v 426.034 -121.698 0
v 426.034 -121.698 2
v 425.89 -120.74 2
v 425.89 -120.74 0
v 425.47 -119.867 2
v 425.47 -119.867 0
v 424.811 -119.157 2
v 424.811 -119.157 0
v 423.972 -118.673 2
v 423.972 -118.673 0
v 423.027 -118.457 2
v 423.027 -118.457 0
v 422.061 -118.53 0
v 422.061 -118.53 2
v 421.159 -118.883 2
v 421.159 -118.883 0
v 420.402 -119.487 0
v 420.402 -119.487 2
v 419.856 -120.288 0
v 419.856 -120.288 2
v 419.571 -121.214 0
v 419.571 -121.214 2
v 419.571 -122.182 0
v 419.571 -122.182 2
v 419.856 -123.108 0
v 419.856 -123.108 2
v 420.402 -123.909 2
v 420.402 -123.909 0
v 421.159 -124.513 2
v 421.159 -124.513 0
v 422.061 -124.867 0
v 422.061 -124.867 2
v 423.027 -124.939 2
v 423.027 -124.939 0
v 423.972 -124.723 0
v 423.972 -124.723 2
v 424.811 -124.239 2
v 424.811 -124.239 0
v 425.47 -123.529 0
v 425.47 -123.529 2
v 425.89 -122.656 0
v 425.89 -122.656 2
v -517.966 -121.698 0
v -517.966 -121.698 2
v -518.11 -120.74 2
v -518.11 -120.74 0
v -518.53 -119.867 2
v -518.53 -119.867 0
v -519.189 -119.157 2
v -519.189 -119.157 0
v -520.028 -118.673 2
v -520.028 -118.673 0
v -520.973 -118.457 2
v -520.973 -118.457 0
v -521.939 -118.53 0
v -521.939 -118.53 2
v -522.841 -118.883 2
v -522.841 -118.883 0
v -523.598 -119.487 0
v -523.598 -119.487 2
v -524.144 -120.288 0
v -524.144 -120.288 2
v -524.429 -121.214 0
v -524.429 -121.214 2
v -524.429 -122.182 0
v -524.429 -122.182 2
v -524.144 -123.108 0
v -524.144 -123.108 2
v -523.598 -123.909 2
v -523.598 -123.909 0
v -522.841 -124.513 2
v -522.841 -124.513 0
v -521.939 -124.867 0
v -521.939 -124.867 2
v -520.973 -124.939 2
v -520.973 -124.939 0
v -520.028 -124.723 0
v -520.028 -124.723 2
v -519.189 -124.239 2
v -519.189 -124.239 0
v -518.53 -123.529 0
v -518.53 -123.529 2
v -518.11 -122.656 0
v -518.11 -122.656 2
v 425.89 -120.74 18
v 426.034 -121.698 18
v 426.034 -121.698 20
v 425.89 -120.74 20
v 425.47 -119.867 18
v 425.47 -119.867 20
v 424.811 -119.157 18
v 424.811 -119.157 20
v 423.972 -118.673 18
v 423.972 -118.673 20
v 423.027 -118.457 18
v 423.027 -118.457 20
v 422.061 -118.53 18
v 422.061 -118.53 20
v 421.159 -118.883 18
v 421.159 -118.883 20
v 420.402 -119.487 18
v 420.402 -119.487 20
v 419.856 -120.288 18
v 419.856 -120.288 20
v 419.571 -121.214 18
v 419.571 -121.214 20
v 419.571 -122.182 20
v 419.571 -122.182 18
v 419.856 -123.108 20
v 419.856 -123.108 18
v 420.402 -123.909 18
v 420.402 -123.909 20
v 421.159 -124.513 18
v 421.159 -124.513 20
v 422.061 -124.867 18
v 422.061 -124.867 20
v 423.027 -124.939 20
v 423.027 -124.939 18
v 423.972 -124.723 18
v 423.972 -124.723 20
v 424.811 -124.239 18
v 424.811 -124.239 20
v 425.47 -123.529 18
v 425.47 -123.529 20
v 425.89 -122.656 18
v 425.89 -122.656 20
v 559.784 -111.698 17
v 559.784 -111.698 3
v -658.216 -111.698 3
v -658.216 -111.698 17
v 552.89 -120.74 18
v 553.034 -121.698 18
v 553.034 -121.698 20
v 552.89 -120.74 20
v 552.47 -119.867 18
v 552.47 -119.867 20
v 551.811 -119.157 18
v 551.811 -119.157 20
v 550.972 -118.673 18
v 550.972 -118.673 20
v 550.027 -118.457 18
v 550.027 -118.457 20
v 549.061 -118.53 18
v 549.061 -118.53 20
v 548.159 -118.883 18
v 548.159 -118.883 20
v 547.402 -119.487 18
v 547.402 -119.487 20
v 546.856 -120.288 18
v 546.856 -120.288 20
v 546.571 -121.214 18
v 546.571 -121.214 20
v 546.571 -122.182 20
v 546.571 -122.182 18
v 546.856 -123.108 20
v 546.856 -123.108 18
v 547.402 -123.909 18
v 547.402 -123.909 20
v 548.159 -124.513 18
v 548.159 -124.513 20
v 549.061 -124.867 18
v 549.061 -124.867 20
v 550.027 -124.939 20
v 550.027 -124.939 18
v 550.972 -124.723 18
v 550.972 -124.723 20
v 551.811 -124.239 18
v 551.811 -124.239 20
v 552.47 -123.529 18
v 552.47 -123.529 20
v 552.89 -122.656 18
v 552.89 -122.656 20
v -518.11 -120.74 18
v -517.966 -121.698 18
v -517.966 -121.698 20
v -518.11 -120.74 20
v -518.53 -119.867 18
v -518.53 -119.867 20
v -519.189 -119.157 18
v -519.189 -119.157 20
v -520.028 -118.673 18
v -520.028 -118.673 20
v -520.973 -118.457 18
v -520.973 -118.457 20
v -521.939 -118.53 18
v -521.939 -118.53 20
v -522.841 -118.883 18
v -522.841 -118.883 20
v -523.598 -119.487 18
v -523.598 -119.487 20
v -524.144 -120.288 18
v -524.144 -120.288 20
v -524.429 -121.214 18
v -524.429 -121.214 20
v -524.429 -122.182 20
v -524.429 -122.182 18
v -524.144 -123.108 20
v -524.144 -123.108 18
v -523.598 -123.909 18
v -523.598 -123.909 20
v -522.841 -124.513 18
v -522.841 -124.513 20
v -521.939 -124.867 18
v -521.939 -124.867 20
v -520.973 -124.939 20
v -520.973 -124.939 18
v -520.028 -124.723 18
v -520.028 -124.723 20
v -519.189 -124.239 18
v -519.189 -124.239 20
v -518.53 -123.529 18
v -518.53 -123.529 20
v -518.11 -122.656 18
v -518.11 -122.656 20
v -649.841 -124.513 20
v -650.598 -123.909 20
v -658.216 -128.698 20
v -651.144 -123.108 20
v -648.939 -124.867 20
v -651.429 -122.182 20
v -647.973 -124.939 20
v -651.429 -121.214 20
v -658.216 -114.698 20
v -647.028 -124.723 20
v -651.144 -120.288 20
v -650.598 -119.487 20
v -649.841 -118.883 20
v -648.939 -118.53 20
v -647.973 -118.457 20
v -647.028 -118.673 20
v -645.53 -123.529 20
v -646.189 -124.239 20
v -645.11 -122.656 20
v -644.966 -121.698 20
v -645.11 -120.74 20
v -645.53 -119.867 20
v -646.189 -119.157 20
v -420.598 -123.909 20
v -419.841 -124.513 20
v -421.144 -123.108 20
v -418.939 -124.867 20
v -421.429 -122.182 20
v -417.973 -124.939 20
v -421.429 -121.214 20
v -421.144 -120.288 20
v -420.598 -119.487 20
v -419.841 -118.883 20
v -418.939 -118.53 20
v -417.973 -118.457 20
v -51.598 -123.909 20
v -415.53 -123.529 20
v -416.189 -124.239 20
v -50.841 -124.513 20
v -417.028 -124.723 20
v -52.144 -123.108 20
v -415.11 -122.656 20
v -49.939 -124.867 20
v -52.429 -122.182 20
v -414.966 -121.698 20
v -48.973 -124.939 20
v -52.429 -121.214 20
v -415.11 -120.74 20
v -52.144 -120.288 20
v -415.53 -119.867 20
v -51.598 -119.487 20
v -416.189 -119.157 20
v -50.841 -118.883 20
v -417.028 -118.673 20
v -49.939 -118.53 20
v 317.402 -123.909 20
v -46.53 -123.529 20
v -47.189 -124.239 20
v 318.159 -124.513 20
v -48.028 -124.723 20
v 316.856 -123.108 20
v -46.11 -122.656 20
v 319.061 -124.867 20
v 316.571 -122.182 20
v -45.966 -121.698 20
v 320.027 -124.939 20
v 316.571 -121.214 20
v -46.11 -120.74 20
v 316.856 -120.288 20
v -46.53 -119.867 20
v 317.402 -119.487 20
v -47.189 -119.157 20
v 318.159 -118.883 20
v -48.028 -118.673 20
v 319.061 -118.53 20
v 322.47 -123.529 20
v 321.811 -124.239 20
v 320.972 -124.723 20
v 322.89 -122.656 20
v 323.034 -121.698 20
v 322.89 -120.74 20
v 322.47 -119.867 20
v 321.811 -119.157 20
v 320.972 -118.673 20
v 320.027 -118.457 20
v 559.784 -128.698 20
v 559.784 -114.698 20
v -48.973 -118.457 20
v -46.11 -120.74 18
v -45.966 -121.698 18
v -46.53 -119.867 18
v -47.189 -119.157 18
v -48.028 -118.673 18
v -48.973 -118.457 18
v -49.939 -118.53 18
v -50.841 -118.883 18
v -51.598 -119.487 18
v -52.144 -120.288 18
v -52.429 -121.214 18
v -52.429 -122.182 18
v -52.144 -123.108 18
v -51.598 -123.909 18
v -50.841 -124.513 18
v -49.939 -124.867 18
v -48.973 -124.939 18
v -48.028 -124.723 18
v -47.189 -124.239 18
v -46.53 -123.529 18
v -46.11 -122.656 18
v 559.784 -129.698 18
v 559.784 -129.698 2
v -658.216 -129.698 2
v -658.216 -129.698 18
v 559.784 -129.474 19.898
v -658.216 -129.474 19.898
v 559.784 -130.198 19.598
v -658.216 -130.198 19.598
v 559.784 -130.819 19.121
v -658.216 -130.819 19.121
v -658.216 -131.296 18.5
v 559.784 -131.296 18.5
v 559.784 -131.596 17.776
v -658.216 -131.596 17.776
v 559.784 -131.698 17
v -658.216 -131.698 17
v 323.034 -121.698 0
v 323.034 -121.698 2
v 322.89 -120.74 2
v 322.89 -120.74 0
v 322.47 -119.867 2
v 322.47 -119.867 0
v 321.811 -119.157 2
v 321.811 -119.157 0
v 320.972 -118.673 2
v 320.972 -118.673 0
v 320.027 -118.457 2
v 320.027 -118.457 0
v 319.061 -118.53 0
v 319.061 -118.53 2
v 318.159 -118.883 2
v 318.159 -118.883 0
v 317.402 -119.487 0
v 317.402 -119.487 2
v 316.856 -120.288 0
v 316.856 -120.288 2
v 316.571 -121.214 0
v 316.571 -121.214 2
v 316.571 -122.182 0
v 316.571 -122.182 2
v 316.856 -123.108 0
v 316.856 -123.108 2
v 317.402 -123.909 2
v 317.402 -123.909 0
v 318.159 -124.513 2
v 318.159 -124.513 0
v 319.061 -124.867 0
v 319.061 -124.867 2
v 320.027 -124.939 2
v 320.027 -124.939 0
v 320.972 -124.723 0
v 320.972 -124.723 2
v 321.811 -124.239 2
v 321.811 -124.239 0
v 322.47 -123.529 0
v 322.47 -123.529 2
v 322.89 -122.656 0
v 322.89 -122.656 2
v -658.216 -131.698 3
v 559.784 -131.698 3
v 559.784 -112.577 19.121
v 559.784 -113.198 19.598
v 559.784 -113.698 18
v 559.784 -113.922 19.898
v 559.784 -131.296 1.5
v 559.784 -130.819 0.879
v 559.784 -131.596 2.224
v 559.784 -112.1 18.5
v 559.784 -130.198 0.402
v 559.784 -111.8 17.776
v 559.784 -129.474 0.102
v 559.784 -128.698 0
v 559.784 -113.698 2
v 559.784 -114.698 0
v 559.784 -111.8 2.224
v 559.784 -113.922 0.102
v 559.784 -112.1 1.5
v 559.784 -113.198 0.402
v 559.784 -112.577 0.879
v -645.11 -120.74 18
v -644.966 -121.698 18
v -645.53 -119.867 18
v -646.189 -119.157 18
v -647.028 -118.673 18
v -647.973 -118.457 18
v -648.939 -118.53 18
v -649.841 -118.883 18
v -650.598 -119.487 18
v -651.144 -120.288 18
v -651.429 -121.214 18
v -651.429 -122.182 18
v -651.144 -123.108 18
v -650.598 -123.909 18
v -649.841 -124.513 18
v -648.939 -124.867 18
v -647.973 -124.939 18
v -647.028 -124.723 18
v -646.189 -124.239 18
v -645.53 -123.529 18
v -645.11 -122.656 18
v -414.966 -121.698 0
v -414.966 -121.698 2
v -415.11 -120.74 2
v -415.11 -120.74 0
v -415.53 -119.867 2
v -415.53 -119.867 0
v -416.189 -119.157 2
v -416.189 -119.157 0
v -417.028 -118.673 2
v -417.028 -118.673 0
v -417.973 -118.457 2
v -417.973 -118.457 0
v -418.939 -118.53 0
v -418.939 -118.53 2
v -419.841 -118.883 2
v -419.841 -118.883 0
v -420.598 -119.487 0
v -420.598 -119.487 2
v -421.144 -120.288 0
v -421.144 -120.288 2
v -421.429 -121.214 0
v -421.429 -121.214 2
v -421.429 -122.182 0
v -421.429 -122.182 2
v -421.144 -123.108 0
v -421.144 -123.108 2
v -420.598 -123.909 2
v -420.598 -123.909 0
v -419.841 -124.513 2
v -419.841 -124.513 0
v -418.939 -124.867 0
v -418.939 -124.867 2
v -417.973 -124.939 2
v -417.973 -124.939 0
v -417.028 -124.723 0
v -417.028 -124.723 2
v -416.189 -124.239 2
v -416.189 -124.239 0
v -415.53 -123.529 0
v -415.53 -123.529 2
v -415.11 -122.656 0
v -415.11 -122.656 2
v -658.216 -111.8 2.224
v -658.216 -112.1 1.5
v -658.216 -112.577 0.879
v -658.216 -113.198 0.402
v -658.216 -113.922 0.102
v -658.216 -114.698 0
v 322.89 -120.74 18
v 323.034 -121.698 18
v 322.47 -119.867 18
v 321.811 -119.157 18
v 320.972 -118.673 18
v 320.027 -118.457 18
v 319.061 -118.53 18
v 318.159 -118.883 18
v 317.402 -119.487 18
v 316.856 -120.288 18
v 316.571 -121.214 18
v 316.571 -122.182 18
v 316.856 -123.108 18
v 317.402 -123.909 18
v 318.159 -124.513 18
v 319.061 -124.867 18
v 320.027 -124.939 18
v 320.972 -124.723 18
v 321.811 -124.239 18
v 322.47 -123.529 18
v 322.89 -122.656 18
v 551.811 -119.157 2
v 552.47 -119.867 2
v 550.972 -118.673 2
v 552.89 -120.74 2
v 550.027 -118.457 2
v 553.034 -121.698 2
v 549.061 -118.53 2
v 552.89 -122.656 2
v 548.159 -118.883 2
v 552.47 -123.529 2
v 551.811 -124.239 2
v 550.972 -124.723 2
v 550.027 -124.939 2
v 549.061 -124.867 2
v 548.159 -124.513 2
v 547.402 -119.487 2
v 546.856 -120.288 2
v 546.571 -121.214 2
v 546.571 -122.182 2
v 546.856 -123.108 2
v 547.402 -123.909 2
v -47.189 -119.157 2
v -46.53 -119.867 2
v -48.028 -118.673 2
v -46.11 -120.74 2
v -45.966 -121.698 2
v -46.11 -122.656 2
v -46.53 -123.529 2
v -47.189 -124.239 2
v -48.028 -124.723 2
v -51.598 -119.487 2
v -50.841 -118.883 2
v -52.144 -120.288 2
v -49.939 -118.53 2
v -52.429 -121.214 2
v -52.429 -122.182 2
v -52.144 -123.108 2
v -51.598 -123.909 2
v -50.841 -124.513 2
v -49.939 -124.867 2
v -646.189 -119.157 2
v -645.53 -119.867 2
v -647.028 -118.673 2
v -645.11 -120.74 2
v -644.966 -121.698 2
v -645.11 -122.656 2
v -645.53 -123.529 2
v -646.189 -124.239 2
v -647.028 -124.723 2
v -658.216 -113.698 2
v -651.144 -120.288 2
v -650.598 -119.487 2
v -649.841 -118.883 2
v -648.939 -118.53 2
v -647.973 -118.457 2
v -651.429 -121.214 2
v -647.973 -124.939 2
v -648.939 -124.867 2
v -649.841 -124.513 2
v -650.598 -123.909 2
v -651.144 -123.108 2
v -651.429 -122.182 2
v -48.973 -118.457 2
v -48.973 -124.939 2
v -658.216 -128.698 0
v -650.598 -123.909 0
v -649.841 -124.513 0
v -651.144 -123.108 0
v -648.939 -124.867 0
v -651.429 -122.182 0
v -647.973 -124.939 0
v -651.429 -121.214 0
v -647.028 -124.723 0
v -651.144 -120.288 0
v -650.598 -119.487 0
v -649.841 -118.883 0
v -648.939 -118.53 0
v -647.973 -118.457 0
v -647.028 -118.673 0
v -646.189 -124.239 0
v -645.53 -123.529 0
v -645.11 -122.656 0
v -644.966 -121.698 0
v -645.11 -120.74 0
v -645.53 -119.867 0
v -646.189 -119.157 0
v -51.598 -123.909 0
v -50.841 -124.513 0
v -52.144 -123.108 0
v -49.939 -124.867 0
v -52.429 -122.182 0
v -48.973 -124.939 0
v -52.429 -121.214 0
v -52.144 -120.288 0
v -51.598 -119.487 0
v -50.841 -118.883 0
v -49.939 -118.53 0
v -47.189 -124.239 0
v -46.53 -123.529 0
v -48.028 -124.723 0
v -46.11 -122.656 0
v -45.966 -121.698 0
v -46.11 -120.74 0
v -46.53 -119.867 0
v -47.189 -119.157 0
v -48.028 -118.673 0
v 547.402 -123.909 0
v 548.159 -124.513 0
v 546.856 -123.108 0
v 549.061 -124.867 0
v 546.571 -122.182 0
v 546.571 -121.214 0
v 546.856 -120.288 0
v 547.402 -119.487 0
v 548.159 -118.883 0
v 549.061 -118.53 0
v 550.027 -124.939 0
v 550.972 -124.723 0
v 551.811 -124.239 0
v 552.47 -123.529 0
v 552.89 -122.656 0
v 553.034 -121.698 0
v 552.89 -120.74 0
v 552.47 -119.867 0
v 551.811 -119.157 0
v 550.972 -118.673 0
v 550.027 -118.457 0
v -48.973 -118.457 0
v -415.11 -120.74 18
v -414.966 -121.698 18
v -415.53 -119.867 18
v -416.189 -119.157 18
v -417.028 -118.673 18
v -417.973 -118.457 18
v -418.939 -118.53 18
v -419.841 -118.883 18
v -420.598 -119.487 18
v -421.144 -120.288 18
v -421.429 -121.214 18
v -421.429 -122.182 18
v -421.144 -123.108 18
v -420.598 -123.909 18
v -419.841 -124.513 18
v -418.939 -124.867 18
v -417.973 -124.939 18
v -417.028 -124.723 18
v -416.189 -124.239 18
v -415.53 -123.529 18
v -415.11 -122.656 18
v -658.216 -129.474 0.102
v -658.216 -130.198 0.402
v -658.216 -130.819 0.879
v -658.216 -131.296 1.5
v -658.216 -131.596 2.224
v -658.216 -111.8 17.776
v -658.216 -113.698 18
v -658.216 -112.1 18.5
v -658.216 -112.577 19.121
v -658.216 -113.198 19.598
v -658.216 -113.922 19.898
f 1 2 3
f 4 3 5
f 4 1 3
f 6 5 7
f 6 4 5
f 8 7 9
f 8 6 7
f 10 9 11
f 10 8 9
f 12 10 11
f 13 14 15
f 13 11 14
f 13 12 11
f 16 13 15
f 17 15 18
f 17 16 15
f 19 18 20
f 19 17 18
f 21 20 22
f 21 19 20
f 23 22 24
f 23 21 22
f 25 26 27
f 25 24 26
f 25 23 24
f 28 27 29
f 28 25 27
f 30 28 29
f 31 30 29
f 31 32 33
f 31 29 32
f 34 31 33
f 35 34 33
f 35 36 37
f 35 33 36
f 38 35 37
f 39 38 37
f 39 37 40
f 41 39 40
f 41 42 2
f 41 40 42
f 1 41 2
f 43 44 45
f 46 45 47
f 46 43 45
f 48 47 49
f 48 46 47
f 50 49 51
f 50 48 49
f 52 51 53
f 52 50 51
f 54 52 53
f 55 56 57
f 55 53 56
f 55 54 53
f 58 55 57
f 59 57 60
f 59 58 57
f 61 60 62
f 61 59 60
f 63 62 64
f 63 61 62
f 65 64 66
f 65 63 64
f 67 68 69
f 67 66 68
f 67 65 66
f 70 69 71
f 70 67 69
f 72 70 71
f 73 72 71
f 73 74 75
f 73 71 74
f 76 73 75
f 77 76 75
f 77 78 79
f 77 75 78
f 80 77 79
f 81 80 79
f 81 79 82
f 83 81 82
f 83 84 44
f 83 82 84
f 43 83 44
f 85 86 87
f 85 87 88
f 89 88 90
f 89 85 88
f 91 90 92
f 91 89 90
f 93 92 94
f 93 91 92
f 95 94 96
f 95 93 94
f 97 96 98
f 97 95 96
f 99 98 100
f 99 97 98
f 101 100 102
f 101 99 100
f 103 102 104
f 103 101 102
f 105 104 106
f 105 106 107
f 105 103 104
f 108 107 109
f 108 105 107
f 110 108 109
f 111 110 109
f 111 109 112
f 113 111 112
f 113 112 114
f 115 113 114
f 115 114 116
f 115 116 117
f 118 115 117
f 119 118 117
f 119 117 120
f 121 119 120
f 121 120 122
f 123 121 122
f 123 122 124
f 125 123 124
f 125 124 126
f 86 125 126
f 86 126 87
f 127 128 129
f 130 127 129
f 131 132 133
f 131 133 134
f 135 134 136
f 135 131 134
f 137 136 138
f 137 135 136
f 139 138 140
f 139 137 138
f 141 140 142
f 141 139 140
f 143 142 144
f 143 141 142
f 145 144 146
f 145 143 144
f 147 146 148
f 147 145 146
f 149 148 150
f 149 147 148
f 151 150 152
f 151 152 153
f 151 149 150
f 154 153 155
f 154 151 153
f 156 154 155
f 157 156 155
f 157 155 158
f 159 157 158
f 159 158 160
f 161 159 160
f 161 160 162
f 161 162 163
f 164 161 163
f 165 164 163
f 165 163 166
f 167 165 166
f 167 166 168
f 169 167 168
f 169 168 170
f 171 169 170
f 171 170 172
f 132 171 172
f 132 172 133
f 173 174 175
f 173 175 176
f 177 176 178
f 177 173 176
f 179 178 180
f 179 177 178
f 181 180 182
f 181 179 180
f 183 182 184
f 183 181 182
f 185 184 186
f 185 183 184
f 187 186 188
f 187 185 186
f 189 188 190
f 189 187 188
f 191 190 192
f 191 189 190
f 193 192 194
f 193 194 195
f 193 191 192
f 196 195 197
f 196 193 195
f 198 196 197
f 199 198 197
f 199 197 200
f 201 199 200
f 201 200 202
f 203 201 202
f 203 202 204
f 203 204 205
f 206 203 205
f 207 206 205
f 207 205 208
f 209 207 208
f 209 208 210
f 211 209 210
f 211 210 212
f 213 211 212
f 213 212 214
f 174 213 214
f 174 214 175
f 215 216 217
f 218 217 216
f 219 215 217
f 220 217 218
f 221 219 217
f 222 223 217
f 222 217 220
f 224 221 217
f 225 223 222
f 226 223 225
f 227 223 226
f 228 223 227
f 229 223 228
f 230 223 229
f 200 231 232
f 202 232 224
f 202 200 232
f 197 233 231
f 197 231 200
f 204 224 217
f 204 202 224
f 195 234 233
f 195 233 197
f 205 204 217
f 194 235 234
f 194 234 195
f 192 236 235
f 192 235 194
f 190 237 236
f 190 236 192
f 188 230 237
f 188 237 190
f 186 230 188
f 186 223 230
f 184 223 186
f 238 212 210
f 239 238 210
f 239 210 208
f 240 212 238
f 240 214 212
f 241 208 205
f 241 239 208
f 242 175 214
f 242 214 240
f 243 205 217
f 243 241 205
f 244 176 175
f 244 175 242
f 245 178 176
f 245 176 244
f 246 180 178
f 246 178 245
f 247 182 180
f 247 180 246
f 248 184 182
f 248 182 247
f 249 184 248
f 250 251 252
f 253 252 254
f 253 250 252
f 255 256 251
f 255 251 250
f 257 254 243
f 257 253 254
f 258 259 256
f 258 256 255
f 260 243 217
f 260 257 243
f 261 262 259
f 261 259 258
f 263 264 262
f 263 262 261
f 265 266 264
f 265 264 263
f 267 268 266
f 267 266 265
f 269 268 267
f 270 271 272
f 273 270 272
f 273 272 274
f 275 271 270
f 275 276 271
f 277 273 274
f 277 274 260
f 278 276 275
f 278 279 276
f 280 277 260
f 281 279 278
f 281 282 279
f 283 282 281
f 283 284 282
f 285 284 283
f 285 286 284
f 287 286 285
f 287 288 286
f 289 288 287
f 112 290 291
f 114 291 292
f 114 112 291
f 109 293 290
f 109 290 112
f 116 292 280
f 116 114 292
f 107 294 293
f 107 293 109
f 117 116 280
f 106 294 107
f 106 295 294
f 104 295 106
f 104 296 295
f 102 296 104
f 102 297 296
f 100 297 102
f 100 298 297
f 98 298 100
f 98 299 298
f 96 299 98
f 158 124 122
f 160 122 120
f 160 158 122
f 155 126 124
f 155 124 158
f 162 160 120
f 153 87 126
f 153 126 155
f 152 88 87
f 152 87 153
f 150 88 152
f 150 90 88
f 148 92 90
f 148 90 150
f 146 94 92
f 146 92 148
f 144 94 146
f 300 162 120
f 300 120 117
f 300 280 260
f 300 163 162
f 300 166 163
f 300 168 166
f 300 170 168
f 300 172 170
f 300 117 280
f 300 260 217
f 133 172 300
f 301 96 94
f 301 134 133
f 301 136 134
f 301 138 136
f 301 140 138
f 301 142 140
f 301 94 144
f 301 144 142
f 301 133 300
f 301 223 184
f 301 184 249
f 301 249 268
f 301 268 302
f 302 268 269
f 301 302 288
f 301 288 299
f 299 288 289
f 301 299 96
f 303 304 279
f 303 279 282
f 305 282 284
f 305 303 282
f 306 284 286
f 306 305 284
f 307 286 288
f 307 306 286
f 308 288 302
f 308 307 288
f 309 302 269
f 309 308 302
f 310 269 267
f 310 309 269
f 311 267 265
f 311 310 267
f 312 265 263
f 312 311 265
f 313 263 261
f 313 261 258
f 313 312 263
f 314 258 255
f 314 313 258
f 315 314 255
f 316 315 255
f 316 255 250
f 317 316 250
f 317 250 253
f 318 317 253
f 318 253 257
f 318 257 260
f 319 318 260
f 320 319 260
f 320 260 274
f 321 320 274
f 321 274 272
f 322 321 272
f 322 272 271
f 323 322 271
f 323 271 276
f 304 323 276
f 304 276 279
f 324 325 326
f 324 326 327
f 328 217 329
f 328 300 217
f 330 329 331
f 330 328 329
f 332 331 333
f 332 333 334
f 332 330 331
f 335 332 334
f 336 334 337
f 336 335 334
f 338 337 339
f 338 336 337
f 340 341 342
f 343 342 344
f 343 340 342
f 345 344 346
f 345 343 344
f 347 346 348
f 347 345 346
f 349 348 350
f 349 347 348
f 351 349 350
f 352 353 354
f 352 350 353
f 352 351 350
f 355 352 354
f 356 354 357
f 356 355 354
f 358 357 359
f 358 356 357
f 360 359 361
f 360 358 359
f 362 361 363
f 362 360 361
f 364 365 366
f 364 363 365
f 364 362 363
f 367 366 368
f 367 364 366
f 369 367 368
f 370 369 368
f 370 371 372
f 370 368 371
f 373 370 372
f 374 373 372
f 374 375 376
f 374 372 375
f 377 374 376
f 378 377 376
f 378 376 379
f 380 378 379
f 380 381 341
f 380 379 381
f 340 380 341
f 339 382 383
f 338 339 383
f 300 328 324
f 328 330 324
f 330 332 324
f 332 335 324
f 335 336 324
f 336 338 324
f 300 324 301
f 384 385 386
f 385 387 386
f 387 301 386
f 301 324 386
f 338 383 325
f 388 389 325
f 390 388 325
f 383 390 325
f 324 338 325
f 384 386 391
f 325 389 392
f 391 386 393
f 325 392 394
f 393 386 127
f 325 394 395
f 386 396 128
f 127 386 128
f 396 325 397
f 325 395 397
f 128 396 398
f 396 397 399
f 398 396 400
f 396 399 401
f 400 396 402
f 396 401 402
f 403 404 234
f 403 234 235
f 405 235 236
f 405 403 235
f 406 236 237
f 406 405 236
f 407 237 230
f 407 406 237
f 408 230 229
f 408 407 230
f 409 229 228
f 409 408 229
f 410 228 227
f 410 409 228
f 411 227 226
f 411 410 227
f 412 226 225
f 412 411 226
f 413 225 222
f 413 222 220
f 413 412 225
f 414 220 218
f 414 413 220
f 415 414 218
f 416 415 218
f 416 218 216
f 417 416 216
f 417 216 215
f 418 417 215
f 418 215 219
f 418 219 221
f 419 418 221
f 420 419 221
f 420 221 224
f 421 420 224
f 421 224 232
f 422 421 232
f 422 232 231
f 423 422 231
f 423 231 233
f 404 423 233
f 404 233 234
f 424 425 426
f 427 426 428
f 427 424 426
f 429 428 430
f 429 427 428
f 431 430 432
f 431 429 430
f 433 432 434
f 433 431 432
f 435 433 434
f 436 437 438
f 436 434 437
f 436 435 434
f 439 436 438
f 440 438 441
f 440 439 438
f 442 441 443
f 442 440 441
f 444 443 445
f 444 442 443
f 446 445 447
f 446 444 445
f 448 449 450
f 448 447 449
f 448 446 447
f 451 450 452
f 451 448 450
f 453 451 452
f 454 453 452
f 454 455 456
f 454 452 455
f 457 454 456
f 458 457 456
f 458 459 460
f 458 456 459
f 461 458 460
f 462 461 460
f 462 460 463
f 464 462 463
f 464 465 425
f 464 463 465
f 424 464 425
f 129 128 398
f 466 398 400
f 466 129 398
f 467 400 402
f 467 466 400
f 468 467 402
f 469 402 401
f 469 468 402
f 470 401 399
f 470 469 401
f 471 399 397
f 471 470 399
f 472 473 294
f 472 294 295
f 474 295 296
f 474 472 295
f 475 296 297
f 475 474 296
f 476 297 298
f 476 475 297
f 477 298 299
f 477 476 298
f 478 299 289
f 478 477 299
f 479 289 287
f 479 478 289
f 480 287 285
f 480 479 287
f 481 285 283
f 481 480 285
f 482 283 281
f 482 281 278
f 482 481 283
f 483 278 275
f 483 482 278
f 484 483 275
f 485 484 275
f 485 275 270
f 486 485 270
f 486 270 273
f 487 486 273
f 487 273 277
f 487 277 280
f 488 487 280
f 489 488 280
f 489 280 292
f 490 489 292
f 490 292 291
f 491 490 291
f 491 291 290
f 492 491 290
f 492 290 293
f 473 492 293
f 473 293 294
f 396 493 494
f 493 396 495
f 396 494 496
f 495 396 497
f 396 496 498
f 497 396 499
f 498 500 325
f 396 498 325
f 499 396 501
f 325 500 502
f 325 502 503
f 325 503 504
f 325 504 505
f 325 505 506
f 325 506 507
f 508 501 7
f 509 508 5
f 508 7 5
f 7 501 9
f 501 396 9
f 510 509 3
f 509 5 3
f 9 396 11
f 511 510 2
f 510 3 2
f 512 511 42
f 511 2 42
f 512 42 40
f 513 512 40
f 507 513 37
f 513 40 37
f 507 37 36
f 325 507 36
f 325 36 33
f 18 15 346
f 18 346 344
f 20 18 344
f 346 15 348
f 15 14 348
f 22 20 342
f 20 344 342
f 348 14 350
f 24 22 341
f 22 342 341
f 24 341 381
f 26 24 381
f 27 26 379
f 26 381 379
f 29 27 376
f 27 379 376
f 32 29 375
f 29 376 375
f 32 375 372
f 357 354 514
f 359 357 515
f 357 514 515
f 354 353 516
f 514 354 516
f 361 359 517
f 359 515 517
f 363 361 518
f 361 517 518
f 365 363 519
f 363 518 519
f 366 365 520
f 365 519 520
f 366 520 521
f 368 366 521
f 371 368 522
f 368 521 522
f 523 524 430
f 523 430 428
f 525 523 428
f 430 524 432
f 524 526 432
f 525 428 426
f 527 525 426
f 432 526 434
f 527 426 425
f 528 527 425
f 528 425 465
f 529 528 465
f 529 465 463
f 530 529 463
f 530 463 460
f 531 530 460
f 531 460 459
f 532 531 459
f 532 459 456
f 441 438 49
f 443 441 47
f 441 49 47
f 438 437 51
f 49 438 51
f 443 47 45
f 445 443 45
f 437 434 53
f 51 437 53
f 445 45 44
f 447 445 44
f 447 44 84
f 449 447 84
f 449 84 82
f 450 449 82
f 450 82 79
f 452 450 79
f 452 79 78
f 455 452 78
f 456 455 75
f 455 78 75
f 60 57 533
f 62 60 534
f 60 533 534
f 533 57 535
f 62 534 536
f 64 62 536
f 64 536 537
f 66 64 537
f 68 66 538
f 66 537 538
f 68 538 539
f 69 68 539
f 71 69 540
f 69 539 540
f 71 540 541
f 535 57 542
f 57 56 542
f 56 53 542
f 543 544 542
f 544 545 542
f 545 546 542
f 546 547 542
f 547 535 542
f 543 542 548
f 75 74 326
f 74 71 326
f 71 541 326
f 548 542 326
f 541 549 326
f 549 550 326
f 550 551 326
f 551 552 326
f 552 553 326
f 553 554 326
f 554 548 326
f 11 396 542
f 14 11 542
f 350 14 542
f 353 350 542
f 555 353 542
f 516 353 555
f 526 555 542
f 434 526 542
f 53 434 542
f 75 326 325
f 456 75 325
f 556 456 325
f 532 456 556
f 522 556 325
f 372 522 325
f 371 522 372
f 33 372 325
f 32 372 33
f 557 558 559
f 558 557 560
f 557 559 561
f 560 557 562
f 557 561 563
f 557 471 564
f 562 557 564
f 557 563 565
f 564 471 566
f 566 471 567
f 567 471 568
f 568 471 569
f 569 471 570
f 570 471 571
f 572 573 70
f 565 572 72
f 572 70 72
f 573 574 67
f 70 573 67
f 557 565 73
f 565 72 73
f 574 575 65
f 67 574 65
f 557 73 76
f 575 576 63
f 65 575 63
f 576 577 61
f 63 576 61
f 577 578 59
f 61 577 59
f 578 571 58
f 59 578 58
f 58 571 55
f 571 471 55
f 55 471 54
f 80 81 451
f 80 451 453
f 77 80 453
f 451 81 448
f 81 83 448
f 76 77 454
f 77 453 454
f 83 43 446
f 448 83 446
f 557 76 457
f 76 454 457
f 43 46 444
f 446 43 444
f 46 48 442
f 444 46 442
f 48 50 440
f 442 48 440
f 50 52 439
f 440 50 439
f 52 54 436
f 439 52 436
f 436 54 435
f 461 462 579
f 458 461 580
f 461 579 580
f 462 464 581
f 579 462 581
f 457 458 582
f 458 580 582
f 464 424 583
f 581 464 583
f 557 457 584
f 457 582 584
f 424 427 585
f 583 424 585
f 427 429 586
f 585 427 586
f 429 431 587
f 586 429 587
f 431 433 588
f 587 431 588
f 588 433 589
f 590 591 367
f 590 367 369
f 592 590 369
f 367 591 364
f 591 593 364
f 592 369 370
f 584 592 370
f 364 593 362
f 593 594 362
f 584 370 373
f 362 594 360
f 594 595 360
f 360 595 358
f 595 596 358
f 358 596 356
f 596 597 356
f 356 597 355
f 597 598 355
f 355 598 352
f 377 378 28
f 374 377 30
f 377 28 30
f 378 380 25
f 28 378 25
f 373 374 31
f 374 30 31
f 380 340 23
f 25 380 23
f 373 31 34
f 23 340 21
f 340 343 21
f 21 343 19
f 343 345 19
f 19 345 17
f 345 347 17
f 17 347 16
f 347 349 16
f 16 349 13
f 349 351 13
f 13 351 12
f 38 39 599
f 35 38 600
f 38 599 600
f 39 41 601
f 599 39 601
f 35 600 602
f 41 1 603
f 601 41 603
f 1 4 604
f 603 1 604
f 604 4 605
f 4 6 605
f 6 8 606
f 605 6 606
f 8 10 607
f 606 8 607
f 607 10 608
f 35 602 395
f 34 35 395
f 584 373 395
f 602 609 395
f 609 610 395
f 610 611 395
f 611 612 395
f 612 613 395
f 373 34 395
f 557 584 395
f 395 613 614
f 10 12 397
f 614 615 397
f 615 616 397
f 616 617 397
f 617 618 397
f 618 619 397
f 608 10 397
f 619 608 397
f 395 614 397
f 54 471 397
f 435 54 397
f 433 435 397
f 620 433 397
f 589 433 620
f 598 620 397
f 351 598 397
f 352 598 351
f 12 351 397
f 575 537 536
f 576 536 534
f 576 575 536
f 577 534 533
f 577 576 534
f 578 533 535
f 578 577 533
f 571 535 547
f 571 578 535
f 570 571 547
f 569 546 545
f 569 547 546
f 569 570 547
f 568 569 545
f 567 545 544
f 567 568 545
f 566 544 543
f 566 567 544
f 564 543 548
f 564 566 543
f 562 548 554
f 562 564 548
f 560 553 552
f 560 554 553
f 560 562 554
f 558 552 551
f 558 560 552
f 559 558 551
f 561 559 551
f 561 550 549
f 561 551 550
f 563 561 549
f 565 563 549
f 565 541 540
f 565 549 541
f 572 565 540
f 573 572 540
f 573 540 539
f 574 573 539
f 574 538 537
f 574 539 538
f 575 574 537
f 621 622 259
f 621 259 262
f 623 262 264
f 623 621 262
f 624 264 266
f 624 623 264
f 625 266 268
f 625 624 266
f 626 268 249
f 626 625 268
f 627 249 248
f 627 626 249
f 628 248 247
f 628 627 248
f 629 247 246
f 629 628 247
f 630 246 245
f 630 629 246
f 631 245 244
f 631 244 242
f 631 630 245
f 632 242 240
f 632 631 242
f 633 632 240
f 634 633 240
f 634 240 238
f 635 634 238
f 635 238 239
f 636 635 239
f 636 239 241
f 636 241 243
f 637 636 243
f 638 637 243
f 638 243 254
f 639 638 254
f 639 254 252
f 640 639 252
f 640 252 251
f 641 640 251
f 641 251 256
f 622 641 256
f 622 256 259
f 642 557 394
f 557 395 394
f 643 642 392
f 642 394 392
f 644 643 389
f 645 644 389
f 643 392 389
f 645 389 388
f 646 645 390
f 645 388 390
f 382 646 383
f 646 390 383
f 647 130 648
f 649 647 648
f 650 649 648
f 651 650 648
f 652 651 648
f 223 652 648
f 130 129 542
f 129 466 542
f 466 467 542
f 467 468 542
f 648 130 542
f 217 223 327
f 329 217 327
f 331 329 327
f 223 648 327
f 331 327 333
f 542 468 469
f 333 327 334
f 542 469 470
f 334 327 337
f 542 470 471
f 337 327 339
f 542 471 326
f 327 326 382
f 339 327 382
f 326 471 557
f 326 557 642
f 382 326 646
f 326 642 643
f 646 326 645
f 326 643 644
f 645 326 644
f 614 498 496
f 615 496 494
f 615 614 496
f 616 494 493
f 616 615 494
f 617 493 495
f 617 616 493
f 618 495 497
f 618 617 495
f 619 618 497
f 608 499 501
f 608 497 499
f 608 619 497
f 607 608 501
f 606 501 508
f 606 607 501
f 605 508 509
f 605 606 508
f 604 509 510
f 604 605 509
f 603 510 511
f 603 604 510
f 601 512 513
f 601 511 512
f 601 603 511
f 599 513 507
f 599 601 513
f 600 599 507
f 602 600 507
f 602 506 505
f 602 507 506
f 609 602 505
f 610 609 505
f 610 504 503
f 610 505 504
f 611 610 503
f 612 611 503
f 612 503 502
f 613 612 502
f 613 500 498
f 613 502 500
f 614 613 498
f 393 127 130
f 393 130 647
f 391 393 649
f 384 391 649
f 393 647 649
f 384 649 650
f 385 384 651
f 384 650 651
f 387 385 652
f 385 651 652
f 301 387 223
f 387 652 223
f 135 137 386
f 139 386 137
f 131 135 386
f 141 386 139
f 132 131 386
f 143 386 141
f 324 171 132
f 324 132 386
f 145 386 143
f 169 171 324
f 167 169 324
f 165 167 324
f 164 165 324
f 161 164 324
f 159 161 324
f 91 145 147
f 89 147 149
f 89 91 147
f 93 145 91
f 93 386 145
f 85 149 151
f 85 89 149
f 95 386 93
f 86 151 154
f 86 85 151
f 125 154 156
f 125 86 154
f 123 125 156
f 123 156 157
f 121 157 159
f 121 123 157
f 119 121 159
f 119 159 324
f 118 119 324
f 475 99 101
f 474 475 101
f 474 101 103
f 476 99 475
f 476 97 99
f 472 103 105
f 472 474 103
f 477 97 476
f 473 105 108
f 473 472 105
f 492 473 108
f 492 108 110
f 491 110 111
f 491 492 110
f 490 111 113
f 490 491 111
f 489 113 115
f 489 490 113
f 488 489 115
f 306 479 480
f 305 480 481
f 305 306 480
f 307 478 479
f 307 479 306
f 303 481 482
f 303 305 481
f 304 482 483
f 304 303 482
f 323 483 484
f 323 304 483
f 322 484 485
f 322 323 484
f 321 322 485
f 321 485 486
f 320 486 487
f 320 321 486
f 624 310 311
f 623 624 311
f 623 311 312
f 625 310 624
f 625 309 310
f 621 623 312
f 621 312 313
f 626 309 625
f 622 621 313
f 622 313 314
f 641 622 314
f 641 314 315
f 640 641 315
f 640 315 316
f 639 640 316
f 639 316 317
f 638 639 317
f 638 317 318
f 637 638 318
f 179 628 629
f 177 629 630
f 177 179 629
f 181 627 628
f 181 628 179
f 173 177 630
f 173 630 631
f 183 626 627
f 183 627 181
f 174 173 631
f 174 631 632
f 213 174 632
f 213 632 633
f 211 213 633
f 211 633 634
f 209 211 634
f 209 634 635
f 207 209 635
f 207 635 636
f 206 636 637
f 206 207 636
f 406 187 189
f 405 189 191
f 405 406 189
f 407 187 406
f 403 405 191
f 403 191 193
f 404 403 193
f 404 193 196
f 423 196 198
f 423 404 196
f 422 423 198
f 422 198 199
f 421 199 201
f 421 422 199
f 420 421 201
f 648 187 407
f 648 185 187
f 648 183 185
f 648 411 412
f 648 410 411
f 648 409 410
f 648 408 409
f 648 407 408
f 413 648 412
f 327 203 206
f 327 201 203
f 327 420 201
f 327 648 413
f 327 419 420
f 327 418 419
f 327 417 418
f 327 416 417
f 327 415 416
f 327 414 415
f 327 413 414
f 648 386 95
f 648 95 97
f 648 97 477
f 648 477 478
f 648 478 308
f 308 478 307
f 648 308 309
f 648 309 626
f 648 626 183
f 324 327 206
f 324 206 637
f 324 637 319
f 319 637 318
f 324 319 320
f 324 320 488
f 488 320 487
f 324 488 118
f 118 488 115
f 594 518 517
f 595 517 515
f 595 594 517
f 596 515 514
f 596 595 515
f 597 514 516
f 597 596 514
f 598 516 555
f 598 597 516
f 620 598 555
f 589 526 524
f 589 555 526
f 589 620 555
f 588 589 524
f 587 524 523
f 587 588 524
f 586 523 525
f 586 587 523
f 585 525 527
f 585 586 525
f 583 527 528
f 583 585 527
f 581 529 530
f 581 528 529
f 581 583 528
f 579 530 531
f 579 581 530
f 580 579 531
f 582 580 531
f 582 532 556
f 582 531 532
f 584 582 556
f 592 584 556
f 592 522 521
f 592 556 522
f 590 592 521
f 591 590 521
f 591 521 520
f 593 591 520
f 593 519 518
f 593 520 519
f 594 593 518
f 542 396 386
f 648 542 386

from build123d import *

# Parameters (mm, degrees)
F0_R     = 3.25
F1_DEPTH = 20
F2_W     = 16
F2_H     = 16
F3_DEPTH = 1220
F4_R     = 3


with BuildPart() as f1:
    # F0 (on Top) → F1 (new body)
    with BuildSketch(Plane.XY):
        Polygon((549.784225, -111.698022), (-658.215775, -111.698022), (-658.215775, -131.698022), (-49.215775, -131.698022), (319.784225, -131.698022), (422.784225, -131.698022), (559.784225, -131.698022), (559.784225, -121.698022), (559.784225, -111.698022), align=None)
        with Locations((-521.215775, -121.698022)):
            Circle(F0_R, mode=Mode.SUBTRACT)
        with Locations((-418.215775, -121.698022)):
            Circle(F0_R, mode=Mode.SUBTRACT)
        with Locations((-49.215775, -121.698022)):
            Circle(F0_R, mode=Mode.SUBTRACT)
        with Locations((319.784225, -121.698022)):
            Circle(F0_R, mode=Mode.SUBTRACT)
        with Locations((422.784225, -121.698022)):
            Circle(F0_R, mode=Mode.SUBTRACT)
        with Locations((-648.215775, -121.698022)):
            Circle(F0_R, mode=Mode.SUBTRACT)
        with Locations((549.784225, -121.698022)):
            Circle(F0_R, mode=Mode.SUBTRACT)
    extrude(amount=F1_DEPTH)

    # F2 (on face) → F3 (cut)
    with BuildSketch(Plane(origin=(-658.215775, 0, 0), x_dir=(0, -1, 0), z_dir=(-1, 0, 0))):
        with Locations((121.698022, 10)):
            Rectangle(F2_W, F2_H)
    extrude(amount=-F3_DEPTH, mode=Mode.SUBTRACT)

    # F4
    f4_edges = [f1.edges().sort_by_distance(p)[0] for p in [
        (-49.215775, -131.698022, 20),
        (-49.215775, -111.698022, 20),
        (-49.215775, -131.698022, 0),
        (-49.215775, -111.698022, 0),
    ]]
    fillet(f4_edges, radius=F4_R)


solid = f1.part
